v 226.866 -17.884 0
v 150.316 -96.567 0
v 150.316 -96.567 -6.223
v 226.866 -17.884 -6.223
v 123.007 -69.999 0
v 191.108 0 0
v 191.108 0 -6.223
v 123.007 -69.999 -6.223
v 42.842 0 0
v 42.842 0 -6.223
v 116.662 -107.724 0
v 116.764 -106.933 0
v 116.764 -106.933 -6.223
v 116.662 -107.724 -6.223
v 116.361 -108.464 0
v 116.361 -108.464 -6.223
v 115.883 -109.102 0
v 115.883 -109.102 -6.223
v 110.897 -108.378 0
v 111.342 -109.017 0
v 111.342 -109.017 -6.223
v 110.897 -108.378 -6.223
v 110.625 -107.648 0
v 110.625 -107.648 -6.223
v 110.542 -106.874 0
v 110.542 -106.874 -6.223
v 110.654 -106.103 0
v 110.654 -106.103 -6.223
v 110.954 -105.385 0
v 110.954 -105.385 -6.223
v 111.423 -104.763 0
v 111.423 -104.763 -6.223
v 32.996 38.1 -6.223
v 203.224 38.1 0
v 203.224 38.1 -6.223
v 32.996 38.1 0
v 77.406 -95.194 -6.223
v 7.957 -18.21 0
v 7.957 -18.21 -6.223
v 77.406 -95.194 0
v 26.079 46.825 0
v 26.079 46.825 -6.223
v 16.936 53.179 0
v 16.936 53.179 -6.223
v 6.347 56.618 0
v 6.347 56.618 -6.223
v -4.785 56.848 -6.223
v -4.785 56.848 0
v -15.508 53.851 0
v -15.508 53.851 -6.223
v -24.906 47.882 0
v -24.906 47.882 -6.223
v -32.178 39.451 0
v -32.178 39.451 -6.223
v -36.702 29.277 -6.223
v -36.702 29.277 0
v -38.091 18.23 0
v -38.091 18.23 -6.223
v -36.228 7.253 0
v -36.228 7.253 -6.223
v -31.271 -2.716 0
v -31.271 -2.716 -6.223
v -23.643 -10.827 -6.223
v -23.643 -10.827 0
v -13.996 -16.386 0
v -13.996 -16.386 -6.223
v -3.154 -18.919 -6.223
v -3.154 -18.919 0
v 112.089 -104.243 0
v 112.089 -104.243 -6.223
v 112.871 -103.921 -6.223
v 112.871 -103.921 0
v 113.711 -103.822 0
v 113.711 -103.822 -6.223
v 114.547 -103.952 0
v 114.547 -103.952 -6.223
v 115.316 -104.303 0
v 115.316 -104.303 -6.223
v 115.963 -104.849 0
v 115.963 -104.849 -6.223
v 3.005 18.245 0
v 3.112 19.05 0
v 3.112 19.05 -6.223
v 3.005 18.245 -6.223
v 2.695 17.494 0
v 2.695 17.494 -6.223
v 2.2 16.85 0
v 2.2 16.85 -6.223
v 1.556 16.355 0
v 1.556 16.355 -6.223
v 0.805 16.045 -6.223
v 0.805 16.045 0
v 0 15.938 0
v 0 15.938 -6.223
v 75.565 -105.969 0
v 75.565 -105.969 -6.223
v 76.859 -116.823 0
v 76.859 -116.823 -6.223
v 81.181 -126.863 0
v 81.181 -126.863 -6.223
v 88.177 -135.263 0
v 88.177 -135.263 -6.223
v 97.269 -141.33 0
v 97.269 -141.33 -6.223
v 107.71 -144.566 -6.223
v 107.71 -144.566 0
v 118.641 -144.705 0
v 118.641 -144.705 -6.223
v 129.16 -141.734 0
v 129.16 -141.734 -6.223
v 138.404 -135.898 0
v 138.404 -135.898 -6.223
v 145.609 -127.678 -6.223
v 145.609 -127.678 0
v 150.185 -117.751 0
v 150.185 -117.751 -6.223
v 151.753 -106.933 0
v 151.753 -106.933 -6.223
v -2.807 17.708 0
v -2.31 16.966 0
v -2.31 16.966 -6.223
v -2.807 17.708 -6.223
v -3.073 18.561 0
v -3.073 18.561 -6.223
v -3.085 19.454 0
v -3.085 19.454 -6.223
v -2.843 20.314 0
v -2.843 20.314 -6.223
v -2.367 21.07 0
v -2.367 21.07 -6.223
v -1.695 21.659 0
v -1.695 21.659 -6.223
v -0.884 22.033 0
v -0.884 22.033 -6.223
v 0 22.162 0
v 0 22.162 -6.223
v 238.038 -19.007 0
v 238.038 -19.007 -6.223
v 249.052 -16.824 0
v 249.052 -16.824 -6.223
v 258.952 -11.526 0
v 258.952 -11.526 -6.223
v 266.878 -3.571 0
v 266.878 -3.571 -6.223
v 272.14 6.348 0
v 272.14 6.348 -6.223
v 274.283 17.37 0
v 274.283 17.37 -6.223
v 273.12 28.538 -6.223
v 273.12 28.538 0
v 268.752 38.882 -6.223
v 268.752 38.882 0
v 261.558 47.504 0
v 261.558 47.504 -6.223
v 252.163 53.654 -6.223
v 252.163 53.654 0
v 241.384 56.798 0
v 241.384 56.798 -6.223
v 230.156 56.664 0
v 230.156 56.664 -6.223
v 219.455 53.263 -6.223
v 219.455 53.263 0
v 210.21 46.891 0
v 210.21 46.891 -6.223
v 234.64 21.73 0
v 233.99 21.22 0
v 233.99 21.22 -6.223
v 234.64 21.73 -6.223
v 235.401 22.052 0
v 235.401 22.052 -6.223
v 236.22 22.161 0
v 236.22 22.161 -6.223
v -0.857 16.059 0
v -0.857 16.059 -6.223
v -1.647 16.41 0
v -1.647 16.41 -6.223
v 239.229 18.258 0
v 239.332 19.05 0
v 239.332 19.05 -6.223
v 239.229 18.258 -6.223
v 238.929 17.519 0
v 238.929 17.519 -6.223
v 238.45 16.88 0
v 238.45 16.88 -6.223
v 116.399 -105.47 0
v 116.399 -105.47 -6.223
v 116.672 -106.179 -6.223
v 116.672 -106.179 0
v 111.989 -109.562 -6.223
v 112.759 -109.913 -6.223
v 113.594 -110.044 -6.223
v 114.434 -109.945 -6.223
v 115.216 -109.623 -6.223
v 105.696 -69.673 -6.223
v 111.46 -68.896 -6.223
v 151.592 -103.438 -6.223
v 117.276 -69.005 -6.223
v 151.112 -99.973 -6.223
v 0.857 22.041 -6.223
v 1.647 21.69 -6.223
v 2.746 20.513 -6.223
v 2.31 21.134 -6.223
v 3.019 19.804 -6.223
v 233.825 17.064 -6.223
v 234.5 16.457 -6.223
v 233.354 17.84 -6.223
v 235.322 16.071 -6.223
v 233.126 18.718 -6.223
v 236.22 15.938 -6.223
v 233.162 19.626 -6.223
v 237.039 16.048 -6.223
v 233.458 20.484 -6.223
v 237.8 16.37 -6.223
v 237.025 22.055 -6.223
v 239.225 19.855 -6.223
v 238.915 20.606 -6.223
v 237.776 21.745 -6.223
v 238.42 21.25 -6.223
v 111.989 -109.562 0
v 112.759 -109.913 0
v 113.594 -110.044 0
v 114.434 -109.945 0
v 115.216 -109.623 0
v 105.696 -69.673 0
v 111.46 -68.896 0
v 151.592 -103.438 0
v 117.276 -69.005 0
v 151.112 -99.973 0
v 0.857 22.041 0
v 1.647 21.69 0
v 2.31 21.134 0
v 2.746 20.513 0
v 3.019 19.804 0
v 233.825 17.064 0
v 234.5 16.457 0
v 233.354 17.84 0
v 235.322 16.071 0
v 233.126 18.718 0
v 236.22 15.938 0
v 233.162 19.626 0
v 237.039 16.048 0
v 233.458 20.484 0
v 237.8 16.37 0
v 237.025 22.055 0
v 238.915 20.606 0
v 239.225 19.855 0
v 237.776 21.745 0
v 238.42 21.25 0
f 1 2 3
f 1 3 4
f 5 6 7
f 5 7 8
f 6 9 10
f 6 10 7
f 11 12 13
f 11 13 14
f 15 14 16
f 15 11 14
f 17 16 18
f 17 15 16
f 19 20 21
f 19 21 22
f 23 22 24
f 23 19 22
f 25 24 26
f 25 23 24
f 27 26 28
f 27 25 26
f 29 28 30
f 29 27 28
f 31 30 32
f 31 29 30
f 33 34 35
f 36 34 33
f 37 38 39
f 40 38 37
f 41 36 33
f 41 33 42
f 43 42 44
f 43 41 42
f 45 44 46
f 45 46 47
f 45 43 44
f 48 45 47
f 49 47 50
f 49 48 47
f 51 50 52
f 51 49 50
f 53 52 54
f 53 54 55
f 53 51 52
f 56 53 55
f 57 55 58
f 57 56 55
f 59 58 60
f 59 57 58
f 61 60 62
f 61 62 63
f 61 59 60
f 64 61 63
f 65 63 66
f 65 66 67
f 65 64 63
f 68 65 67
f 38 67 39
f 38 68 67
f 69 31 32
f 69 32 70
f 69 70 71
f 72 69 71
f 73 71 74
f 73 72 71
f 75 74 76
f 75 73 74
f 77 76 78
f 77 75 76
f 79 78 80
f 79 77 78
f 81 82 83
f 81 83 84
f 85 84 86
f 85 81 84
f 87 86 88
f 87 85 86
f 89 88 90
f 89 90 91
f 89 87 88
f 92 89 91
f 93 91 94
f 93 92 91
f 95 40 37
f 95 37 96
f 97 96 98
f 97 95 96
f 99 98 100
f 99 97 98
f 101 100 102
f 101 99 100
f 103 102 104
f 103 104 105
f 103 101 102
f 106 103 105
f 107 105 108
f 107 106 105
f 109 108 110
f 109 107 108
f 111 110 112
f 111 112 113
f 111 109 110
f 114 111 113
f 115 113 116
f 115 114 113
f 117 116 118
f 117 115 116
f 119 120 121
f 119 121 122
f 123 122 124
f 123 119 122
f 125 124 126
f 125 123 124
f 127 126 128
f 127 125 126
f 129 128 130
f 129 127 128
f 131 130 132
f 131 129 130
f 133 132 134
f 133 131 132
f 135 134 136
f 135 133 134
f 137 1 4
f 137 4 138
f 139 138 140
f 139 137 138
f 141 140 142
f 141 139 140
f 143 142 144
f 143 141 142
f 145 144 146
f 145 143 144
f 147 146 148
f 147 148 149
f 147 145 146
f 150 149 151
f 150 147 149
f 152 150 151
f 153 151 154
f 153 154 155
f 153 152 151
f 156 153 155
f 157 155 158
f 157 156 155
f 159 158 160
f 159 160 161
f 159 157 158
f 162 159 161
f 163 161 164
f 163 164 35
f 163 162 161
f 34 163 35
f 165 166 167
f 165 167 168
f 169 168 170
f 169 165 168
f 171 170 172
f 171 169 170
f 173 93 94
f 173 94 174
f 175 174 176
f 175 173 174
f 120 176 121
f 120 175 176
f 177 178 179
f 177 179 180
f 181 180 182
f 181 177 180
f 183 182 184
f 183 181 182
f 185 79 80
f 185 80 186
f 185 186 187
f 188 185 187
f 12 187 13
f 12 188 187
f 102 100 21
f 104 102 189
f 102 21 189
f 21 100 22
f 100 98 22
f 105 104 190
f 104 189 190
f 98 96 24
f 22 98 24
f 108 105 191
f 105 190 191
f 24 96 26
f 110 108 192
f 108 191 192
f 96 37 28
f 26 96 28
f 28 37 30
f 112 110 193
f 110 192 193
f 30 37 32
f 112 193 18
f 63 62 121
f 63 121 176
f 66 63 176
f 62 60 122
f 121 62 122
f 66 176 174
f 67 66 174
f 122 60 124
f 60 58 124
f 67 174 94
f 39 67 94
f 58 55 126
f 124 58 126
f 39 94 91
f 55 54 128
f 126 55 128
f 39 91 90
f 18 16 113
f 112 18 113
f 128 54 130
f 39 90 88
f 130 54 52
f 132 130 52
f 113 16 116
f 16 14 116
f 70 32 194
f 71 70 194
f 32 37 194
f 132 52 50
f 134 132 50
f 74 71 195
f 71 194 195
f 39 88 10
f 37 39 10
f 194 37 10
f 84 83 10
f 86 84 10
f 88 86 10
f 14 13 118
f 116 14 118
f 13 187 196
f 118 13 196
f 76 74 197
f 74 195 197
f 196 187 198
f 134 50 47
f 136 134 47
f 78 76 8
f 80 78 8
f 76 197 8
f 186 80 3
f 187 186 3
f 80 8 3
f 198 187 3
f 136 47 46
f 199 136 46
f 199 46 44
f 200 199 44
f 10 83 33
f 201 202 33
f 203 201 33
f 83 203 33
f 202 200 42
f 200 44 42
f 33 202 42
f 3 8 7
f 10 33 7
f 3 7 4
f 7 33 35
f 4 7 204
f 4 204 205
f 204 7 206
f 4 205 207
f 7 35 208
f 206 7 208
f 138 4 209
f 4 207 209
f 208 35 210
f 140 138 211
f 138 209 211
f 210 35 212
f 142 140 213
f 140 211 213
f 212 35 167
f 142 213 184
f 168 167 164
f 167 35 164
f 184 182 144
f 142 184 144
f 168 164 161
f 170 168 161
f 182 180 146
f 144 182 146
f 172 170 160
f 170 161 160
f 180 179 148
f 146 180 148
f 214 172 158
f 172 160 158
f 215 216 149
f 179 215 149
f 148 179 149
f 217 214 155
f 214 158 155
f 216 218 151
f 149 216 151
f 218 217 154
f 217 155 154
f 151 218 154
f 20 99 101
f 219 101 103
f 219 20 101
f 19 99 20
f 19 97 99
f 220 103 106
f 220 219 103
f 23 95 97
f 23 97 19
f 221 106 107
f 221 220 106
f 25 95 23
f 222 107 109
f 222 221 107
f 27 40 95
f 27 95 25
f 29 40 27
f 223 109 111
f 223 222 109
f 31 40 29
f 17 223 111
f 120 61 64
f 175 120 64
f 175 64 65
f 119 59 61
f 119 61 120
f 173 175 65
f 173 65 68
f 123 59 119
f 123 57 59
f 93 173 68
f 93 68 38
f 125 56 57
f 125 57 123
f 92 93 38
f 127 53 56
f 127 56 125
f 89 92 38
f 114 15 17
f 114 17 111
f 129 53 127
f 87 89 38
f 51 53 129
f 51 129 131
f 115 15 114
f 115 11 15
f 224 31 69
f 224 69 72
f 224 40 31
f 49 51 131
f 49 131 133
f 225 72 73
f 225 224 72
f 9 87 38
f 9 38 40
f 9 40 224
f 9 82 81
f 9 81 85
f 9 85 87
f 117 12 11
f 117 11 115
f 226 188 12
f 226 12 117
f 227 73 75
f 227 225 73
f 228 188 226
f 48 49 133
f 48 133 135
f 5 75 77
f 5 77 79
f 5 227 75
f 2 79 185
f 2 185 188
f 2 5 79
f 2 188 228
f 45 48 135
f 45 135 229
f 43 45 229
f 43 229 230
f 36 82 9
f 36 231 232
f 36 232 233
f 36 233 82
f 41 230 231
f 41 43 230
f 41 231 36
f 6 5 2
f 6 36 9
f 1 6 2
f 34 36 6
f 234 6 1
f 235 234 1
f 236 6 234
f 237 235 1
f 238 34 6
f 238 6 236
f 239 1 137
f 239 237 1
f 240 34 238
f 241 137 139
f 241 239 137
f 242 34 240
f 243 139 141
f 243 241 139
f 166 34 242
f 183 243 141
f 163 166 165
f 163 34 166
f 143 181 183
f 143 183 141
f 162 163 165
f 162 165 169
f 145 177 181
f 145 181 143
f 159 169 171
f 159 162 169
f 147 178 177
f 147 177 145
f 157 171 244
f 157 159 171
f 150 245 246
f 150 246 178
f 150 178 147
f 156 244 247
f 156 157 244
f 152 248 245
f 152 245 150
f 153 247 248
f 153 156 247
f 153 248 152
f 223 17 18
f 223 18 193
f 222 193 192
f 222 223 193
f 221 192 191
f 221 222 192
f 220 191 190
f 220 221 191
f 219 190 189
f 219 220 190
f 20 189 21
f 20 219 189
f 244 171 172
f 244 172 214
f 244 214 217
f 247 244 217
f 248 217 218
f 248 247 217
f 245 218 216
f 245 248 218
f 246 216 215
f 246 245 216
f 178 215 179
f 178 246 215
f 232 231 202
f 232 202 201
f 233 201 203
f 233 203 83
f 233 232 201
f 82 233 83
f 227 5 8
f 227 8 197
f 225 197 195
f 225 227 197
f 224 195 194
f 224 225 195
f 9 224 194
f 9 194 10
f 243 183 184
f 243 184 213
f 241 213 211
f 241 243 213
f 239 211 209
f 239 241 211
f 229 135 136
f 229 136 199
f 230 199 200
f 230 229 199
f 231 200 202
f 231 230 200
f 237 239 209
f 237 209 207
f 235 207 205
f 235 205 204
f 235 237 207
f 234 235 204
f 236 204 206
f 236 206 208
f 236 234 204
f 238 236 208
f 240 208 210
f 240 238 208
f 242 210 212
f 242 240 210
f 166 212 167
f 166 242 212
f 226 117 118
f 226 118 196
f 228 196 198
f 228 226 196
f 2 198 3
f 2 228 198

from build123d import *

# Parameters (mm, degrees)
BOSS_EXTRUDE1_DEPTH = 6.223


with BuildPart() as part:
    # Sketch1 → Boss-Extrude1 (new body)
    with BuildSketch(Plane.XY):
        with BuildLine():
            ThreePointArc((32.995567884, 38.1), (-34.813454061, 34.530097426), (7.956908754, -18.209865849))
            Line((7.956908754, -18.209865849), (-14.14476943, 6.28959257))
            Line((-14.14476943, 6.28959257), (-2.310313541, 16.965801451))
            ThreePointArc((-2.310313541, 16.965801451), (-2.843098313, 20.314208935), (0, 22.1615))
            Line((0, 22.1615), (0, 38.1))
            Line((0, 38.1), (32.995567884, 38.1))
        make_face()
        with BuildLine():
            Line((14.14476656, 31.810410611), (36.246444744, 7.310952192))
            ThreePointArc((36.246444744, 7.310952192), (37.633758414, 13.10775904), (38.1, 19.05))
            ThreePointArc((38.1, 19.05), (36.801773982, 28.911005618), (32.995567884, 38.1))
            Line((32.995567884, 38.1), (0, 38.1))
            Line((0, 38.1), (0, 22.1615))
            ThreePointArc((0, 22.1615), (1.264206978, 21.893099184), (2.310310671, 21.134201731))
            Line((2.310310671, 21.134201731), (14.14476656, 31.810410611))
        make_face()
        with BuildLine():
            Line((0, 15.9385), (0, 0))
            Line((0, 0), (32.995567884, 0))
            ThreePointArc((32.995567884, 0), (34.813454061, 3.569902574), (36.246444744, 7.310952192))
            Line((36.246444744, 7.310952192), (14.14476656, 31.810410611))
            Line((14.14476656, 31.810410611), (2.310310671, 21.134201731))
            ThreePointArc((2.310310671, 21.134201731), (2.904304039, 20.166445385), (3.1115, 19.05))
            ThreePointArc((3.1115, 19.05), (2.20016275, 16.84983725), (0, 15.9385))
        make_face()
        with BuildLine():
            Line((32.995567884, 0), (0, 0))
            Line((0, 0), (0, 15.9385))
            ThreePointArc((0, 15.9385), (-1.264208935, 16.206901687), (-2.310313541, 16.965801451))
            Line((-2.310313541, 16.965801451), (-14.14476943, 6.28959257))
            Line((-14.14476943, 6.28959257), (7.956908754, -18.209865849))
            ThreePointArc((7.956908754, -18.209865849), (22.409286898, -11.762884655), (32.995567884, 0))
        make_face()
        with BuildLine():
            Line((36.246444744, 7.310952192), (42.841868602, 0))
            Line((42.841868602, 0), (191.108363525, 0))
            Line((191.108363525, 0), (199.557192075, 8.684262446))
            ThreePointArc((199.557192075, 8.684262446), (198.412676185, 23.763413406), (203.224432116, 38.1))
            Line((203.224432116, 38.1), (32.995567884, 38.1))
            ThreePointArc((32.995567884, 38.1), (36.801773982, 28.911005618), (38.1, 19.05))
            ThreePointArc((38.1, 19.05), (37.633758414, 13.10775904), (36.246444744, 7.310952192))
        make_face()
        with BuildLine():
            ThreePointArc((36.246444744, 7.310952192), (34.813454061, 3.569902574), (32.995567884, 0))
            Line((32.995567884, 0), (42.841868602, 0))
            Line((42.841868602, 0), (36.246444744, 7.310952192))
        make_face()
        with BuildLine():
            Line((42.841868602, 0), (32.995567884, 0))
            ThreePointArc((32.995567884, 0), (22.409286898, -11.762884655), (7.956908754, -18.209865849))
            Line((7.956908754, -18.209865849), (77.406264934, -95.193685799))
            ThreePointArc((77.406264934, -95.193685799), (88.131891636, -78.643197617), (105.695800923, -69.672867758))
            Line((105.695800923, -69.672867758), (42.841868602, 0))
        make_face()
        with BuildLine():
            ThreePointArc((203.224432116, 38.1), (198.412676185, 23.763413406), (199.557192075, 8.684262446))
            Line((199.557192075, 8.684262446), (222.565801994, 32.33402713))
            Line((222.565801994, 32.33402713), (233.989814326, 21.219724431))
            ThreePointArc((233.989814326, 21.219724431), (235.00955903, 21.916402782), (236.22, 22.1615))
            Line((236.22, 22.1615), (236.22, 38.1))
            Line((236.22, 38.1), (203.224432116, 38.1))
        make_face()
        with BuildLine():
            Line((199.557192075, 8.684262446), (191.108363525, 0))
            Line((191.108363525, 0), (203.224432116, 0))
            ThreePointArc((203.224432116, 0), (201.121190424, 4.228273841), (199.557192075, 8.684262446))
        make_face()
        with BuildLine():
            ThreePointArc((199.557192075, 8.684262446), (201.121190424, 4.228273841), (203.224432116, 0))
            Line((203.224432116, 0), (236.22, 0))
            Line((236.22, 0), (236.22, 15.9385))
            ThreePointArc((236.22, 15.9385), (233.353597218, 17.83955903), (233.989814326, 21.219724431))
            Line((233.989814326, 21.219724431), (222.565801994, 32.33402713))
            Line((222.565801994, 32.33402713), (199.557192075, 8.684262446))
        make_face()
        with BuildLine():
            ThreePointArc((274.32, 19.05), (246.081005618, 55.851773982), (203.224432116, 38.1))
            Line((203.224432116, 38.1), (236.22, 38.1))
            Line((236.22, 38.1), (236.22, 22.1615))
            ThreePointArc((236.22, 22.1615), (238.42016275, 21.25016275), (239.3315, 19.05))
            ThreePointArc((239.3315, 19.05), (239.102763863, 17.879058173), (238.450185674, 16.880275569))
            Line((238.450185674, 16.880275569), (249.874198006, 5.76597287))
            Line((249.874198006, 5.76597287), (226.865588088, -17.883791814))
            ThreePointArc((226.865588088, -17.883791814), (259.620928466, -11.01670163), (274.32, 19.05))
        make_face()
        with BuildLine():
            Line((236.22, 0), (203.224432116, 0))
            ThreePointArc((203.224432116, 0), (213.234402344, -11.33539617), (226.865588088, -17.883791814))
            Line((226.865588088, -17.883791814), (249.874198006, 5.76597287))
            Line((249.874198006, 5.76597287), (238.450185674, 16.880275569))
            ThreePointArc((238.450185674, 16.880275569), (237.43044097, 16.183597218), (236.22, 15.9385))
            Line((236.22, 15.9385), (236.22, 0))
        make_face()
        with BuildLine():
            Line((203.224432116, 0), (191.108363525, 0))
            Line((191.108363525, 0), (123.00712159, -69.998941792))
            ThreePointArc((123.00712159, -69.998941792), (140.220763938, -79.624337594), (150.315517603, -96.566996053))
            Line((150.315517603, -96.566996053), (226.865588088, -17.883791814))
            ThreePointArc((226.865588088, -17.883791814), (213.234402344, -11.33539617), (203.224432116, 0))
        make_face()
        with BuildLine():
            ThreePointArc((123.00712159, -69.998941792), (114.370229599, -68.839490568), (105.695800923, -69.672867758))
            Line((105.695800923, -69.672867758), (114.17744096, -79.07466909))
            Line((114.17744096, -79.07466909), (123.00712159, -69.998941792))
        make_face()
        with BuildLine():
            Line((114.17744096, -79.07466909), (105.695800923, -69.672867758))
            ThreePointArc((105.695800923, -69.672867758), (88.131891636, -78.643197617), (77.406264934, -95.193685799))
            Line((77.406264934, -95.193685799), (99.507943118, -119.693144218))
            Line((99.507943118, -119.693144218), (111.342399007, -109.016935337))
            ThreePointArc((111.342399007, -109.016935337), (110.541761476, -106.874137217), (111.422524003, -104.763009175))
            Line((111.422524003, -104.763009175), (99.998511671, -93.648706476))
            Line((99.998511671, -93.648706476), (114.17744096, -79.07466909))
        make_face()
        with BuildLine():
            Line((127.797479107, -94.172326176), (114.17744096, -79.07466909))
            Line((114.17744096, -79.07466909), (99.998511671, -93.648706476))
            Line((99.998511671, -93.648706476), (111.422524003, -104.763009175))
            ThreePointArc((111.422524003, -104.763009175), (113.711308209, -103.821785445), (115.963023218, -104.848535057))
            Line((115.963023218, -104.848535057), (127.797479107, -94.172326176))
        make_face()
        with BuildLine():
            ThreePointArc((150.315517603, -96.566996053), (140.220763938, -79.624337594), (123.00712159, -69.998941792))
            Line((123.00712159, -69.998941792), (114.17744096, -79.07466909))
            Line((114.17744096, -79.07466909), (127.797479107, -94.172326176))
            Line((127.797479107, -94.172326176), (115.963023218, -104.848535057))
            ThreePointArc((115.963023218, -104.848535057), (116.557014485, -105.816290221), (116.764209677, -106.932733607))
            ThreePointArc((116.764209677, -106.932733607), (116.53547354, -108.103675433), (115.882895352, -109.102458038))
            Line((115.882895352, -109.102458038), (127.306907684, -120.216760737))
            Line((127.306907684, -120.216760737), (150.315517603, -96.566996053))
        make_face()
        with BuildLine():
            Line((99.507943118, -119.693144218), (77.406264934, -95.193685799))
            ThreePointArc((77.406264934, -95.193685799), (107.710468717, -144.566492021), (151.752709677, -106.932733607))
            ThreePointArc((151.752709677, -106.932733607), (151.39170133, -101.700285898), (150.315517603, -96.566996053))
            Line((150.315517603, -96.566996053), (127.306907684, -120.216760737))
            Line((127.306907684, -120.216760737), (115.882895352, -109.102458038))
            ThreePointArc((115.882895352, -109.102458038), (113.594113288, -110.043681808), (111.342399007, -109.016935337))
            Line((111.342399007, -109.016935337), (99.507943118, -119.693144218))
        make_face()
    extrude(amount=-BOSS_EXTRUDE1_DEPTH)


solid = part.part
